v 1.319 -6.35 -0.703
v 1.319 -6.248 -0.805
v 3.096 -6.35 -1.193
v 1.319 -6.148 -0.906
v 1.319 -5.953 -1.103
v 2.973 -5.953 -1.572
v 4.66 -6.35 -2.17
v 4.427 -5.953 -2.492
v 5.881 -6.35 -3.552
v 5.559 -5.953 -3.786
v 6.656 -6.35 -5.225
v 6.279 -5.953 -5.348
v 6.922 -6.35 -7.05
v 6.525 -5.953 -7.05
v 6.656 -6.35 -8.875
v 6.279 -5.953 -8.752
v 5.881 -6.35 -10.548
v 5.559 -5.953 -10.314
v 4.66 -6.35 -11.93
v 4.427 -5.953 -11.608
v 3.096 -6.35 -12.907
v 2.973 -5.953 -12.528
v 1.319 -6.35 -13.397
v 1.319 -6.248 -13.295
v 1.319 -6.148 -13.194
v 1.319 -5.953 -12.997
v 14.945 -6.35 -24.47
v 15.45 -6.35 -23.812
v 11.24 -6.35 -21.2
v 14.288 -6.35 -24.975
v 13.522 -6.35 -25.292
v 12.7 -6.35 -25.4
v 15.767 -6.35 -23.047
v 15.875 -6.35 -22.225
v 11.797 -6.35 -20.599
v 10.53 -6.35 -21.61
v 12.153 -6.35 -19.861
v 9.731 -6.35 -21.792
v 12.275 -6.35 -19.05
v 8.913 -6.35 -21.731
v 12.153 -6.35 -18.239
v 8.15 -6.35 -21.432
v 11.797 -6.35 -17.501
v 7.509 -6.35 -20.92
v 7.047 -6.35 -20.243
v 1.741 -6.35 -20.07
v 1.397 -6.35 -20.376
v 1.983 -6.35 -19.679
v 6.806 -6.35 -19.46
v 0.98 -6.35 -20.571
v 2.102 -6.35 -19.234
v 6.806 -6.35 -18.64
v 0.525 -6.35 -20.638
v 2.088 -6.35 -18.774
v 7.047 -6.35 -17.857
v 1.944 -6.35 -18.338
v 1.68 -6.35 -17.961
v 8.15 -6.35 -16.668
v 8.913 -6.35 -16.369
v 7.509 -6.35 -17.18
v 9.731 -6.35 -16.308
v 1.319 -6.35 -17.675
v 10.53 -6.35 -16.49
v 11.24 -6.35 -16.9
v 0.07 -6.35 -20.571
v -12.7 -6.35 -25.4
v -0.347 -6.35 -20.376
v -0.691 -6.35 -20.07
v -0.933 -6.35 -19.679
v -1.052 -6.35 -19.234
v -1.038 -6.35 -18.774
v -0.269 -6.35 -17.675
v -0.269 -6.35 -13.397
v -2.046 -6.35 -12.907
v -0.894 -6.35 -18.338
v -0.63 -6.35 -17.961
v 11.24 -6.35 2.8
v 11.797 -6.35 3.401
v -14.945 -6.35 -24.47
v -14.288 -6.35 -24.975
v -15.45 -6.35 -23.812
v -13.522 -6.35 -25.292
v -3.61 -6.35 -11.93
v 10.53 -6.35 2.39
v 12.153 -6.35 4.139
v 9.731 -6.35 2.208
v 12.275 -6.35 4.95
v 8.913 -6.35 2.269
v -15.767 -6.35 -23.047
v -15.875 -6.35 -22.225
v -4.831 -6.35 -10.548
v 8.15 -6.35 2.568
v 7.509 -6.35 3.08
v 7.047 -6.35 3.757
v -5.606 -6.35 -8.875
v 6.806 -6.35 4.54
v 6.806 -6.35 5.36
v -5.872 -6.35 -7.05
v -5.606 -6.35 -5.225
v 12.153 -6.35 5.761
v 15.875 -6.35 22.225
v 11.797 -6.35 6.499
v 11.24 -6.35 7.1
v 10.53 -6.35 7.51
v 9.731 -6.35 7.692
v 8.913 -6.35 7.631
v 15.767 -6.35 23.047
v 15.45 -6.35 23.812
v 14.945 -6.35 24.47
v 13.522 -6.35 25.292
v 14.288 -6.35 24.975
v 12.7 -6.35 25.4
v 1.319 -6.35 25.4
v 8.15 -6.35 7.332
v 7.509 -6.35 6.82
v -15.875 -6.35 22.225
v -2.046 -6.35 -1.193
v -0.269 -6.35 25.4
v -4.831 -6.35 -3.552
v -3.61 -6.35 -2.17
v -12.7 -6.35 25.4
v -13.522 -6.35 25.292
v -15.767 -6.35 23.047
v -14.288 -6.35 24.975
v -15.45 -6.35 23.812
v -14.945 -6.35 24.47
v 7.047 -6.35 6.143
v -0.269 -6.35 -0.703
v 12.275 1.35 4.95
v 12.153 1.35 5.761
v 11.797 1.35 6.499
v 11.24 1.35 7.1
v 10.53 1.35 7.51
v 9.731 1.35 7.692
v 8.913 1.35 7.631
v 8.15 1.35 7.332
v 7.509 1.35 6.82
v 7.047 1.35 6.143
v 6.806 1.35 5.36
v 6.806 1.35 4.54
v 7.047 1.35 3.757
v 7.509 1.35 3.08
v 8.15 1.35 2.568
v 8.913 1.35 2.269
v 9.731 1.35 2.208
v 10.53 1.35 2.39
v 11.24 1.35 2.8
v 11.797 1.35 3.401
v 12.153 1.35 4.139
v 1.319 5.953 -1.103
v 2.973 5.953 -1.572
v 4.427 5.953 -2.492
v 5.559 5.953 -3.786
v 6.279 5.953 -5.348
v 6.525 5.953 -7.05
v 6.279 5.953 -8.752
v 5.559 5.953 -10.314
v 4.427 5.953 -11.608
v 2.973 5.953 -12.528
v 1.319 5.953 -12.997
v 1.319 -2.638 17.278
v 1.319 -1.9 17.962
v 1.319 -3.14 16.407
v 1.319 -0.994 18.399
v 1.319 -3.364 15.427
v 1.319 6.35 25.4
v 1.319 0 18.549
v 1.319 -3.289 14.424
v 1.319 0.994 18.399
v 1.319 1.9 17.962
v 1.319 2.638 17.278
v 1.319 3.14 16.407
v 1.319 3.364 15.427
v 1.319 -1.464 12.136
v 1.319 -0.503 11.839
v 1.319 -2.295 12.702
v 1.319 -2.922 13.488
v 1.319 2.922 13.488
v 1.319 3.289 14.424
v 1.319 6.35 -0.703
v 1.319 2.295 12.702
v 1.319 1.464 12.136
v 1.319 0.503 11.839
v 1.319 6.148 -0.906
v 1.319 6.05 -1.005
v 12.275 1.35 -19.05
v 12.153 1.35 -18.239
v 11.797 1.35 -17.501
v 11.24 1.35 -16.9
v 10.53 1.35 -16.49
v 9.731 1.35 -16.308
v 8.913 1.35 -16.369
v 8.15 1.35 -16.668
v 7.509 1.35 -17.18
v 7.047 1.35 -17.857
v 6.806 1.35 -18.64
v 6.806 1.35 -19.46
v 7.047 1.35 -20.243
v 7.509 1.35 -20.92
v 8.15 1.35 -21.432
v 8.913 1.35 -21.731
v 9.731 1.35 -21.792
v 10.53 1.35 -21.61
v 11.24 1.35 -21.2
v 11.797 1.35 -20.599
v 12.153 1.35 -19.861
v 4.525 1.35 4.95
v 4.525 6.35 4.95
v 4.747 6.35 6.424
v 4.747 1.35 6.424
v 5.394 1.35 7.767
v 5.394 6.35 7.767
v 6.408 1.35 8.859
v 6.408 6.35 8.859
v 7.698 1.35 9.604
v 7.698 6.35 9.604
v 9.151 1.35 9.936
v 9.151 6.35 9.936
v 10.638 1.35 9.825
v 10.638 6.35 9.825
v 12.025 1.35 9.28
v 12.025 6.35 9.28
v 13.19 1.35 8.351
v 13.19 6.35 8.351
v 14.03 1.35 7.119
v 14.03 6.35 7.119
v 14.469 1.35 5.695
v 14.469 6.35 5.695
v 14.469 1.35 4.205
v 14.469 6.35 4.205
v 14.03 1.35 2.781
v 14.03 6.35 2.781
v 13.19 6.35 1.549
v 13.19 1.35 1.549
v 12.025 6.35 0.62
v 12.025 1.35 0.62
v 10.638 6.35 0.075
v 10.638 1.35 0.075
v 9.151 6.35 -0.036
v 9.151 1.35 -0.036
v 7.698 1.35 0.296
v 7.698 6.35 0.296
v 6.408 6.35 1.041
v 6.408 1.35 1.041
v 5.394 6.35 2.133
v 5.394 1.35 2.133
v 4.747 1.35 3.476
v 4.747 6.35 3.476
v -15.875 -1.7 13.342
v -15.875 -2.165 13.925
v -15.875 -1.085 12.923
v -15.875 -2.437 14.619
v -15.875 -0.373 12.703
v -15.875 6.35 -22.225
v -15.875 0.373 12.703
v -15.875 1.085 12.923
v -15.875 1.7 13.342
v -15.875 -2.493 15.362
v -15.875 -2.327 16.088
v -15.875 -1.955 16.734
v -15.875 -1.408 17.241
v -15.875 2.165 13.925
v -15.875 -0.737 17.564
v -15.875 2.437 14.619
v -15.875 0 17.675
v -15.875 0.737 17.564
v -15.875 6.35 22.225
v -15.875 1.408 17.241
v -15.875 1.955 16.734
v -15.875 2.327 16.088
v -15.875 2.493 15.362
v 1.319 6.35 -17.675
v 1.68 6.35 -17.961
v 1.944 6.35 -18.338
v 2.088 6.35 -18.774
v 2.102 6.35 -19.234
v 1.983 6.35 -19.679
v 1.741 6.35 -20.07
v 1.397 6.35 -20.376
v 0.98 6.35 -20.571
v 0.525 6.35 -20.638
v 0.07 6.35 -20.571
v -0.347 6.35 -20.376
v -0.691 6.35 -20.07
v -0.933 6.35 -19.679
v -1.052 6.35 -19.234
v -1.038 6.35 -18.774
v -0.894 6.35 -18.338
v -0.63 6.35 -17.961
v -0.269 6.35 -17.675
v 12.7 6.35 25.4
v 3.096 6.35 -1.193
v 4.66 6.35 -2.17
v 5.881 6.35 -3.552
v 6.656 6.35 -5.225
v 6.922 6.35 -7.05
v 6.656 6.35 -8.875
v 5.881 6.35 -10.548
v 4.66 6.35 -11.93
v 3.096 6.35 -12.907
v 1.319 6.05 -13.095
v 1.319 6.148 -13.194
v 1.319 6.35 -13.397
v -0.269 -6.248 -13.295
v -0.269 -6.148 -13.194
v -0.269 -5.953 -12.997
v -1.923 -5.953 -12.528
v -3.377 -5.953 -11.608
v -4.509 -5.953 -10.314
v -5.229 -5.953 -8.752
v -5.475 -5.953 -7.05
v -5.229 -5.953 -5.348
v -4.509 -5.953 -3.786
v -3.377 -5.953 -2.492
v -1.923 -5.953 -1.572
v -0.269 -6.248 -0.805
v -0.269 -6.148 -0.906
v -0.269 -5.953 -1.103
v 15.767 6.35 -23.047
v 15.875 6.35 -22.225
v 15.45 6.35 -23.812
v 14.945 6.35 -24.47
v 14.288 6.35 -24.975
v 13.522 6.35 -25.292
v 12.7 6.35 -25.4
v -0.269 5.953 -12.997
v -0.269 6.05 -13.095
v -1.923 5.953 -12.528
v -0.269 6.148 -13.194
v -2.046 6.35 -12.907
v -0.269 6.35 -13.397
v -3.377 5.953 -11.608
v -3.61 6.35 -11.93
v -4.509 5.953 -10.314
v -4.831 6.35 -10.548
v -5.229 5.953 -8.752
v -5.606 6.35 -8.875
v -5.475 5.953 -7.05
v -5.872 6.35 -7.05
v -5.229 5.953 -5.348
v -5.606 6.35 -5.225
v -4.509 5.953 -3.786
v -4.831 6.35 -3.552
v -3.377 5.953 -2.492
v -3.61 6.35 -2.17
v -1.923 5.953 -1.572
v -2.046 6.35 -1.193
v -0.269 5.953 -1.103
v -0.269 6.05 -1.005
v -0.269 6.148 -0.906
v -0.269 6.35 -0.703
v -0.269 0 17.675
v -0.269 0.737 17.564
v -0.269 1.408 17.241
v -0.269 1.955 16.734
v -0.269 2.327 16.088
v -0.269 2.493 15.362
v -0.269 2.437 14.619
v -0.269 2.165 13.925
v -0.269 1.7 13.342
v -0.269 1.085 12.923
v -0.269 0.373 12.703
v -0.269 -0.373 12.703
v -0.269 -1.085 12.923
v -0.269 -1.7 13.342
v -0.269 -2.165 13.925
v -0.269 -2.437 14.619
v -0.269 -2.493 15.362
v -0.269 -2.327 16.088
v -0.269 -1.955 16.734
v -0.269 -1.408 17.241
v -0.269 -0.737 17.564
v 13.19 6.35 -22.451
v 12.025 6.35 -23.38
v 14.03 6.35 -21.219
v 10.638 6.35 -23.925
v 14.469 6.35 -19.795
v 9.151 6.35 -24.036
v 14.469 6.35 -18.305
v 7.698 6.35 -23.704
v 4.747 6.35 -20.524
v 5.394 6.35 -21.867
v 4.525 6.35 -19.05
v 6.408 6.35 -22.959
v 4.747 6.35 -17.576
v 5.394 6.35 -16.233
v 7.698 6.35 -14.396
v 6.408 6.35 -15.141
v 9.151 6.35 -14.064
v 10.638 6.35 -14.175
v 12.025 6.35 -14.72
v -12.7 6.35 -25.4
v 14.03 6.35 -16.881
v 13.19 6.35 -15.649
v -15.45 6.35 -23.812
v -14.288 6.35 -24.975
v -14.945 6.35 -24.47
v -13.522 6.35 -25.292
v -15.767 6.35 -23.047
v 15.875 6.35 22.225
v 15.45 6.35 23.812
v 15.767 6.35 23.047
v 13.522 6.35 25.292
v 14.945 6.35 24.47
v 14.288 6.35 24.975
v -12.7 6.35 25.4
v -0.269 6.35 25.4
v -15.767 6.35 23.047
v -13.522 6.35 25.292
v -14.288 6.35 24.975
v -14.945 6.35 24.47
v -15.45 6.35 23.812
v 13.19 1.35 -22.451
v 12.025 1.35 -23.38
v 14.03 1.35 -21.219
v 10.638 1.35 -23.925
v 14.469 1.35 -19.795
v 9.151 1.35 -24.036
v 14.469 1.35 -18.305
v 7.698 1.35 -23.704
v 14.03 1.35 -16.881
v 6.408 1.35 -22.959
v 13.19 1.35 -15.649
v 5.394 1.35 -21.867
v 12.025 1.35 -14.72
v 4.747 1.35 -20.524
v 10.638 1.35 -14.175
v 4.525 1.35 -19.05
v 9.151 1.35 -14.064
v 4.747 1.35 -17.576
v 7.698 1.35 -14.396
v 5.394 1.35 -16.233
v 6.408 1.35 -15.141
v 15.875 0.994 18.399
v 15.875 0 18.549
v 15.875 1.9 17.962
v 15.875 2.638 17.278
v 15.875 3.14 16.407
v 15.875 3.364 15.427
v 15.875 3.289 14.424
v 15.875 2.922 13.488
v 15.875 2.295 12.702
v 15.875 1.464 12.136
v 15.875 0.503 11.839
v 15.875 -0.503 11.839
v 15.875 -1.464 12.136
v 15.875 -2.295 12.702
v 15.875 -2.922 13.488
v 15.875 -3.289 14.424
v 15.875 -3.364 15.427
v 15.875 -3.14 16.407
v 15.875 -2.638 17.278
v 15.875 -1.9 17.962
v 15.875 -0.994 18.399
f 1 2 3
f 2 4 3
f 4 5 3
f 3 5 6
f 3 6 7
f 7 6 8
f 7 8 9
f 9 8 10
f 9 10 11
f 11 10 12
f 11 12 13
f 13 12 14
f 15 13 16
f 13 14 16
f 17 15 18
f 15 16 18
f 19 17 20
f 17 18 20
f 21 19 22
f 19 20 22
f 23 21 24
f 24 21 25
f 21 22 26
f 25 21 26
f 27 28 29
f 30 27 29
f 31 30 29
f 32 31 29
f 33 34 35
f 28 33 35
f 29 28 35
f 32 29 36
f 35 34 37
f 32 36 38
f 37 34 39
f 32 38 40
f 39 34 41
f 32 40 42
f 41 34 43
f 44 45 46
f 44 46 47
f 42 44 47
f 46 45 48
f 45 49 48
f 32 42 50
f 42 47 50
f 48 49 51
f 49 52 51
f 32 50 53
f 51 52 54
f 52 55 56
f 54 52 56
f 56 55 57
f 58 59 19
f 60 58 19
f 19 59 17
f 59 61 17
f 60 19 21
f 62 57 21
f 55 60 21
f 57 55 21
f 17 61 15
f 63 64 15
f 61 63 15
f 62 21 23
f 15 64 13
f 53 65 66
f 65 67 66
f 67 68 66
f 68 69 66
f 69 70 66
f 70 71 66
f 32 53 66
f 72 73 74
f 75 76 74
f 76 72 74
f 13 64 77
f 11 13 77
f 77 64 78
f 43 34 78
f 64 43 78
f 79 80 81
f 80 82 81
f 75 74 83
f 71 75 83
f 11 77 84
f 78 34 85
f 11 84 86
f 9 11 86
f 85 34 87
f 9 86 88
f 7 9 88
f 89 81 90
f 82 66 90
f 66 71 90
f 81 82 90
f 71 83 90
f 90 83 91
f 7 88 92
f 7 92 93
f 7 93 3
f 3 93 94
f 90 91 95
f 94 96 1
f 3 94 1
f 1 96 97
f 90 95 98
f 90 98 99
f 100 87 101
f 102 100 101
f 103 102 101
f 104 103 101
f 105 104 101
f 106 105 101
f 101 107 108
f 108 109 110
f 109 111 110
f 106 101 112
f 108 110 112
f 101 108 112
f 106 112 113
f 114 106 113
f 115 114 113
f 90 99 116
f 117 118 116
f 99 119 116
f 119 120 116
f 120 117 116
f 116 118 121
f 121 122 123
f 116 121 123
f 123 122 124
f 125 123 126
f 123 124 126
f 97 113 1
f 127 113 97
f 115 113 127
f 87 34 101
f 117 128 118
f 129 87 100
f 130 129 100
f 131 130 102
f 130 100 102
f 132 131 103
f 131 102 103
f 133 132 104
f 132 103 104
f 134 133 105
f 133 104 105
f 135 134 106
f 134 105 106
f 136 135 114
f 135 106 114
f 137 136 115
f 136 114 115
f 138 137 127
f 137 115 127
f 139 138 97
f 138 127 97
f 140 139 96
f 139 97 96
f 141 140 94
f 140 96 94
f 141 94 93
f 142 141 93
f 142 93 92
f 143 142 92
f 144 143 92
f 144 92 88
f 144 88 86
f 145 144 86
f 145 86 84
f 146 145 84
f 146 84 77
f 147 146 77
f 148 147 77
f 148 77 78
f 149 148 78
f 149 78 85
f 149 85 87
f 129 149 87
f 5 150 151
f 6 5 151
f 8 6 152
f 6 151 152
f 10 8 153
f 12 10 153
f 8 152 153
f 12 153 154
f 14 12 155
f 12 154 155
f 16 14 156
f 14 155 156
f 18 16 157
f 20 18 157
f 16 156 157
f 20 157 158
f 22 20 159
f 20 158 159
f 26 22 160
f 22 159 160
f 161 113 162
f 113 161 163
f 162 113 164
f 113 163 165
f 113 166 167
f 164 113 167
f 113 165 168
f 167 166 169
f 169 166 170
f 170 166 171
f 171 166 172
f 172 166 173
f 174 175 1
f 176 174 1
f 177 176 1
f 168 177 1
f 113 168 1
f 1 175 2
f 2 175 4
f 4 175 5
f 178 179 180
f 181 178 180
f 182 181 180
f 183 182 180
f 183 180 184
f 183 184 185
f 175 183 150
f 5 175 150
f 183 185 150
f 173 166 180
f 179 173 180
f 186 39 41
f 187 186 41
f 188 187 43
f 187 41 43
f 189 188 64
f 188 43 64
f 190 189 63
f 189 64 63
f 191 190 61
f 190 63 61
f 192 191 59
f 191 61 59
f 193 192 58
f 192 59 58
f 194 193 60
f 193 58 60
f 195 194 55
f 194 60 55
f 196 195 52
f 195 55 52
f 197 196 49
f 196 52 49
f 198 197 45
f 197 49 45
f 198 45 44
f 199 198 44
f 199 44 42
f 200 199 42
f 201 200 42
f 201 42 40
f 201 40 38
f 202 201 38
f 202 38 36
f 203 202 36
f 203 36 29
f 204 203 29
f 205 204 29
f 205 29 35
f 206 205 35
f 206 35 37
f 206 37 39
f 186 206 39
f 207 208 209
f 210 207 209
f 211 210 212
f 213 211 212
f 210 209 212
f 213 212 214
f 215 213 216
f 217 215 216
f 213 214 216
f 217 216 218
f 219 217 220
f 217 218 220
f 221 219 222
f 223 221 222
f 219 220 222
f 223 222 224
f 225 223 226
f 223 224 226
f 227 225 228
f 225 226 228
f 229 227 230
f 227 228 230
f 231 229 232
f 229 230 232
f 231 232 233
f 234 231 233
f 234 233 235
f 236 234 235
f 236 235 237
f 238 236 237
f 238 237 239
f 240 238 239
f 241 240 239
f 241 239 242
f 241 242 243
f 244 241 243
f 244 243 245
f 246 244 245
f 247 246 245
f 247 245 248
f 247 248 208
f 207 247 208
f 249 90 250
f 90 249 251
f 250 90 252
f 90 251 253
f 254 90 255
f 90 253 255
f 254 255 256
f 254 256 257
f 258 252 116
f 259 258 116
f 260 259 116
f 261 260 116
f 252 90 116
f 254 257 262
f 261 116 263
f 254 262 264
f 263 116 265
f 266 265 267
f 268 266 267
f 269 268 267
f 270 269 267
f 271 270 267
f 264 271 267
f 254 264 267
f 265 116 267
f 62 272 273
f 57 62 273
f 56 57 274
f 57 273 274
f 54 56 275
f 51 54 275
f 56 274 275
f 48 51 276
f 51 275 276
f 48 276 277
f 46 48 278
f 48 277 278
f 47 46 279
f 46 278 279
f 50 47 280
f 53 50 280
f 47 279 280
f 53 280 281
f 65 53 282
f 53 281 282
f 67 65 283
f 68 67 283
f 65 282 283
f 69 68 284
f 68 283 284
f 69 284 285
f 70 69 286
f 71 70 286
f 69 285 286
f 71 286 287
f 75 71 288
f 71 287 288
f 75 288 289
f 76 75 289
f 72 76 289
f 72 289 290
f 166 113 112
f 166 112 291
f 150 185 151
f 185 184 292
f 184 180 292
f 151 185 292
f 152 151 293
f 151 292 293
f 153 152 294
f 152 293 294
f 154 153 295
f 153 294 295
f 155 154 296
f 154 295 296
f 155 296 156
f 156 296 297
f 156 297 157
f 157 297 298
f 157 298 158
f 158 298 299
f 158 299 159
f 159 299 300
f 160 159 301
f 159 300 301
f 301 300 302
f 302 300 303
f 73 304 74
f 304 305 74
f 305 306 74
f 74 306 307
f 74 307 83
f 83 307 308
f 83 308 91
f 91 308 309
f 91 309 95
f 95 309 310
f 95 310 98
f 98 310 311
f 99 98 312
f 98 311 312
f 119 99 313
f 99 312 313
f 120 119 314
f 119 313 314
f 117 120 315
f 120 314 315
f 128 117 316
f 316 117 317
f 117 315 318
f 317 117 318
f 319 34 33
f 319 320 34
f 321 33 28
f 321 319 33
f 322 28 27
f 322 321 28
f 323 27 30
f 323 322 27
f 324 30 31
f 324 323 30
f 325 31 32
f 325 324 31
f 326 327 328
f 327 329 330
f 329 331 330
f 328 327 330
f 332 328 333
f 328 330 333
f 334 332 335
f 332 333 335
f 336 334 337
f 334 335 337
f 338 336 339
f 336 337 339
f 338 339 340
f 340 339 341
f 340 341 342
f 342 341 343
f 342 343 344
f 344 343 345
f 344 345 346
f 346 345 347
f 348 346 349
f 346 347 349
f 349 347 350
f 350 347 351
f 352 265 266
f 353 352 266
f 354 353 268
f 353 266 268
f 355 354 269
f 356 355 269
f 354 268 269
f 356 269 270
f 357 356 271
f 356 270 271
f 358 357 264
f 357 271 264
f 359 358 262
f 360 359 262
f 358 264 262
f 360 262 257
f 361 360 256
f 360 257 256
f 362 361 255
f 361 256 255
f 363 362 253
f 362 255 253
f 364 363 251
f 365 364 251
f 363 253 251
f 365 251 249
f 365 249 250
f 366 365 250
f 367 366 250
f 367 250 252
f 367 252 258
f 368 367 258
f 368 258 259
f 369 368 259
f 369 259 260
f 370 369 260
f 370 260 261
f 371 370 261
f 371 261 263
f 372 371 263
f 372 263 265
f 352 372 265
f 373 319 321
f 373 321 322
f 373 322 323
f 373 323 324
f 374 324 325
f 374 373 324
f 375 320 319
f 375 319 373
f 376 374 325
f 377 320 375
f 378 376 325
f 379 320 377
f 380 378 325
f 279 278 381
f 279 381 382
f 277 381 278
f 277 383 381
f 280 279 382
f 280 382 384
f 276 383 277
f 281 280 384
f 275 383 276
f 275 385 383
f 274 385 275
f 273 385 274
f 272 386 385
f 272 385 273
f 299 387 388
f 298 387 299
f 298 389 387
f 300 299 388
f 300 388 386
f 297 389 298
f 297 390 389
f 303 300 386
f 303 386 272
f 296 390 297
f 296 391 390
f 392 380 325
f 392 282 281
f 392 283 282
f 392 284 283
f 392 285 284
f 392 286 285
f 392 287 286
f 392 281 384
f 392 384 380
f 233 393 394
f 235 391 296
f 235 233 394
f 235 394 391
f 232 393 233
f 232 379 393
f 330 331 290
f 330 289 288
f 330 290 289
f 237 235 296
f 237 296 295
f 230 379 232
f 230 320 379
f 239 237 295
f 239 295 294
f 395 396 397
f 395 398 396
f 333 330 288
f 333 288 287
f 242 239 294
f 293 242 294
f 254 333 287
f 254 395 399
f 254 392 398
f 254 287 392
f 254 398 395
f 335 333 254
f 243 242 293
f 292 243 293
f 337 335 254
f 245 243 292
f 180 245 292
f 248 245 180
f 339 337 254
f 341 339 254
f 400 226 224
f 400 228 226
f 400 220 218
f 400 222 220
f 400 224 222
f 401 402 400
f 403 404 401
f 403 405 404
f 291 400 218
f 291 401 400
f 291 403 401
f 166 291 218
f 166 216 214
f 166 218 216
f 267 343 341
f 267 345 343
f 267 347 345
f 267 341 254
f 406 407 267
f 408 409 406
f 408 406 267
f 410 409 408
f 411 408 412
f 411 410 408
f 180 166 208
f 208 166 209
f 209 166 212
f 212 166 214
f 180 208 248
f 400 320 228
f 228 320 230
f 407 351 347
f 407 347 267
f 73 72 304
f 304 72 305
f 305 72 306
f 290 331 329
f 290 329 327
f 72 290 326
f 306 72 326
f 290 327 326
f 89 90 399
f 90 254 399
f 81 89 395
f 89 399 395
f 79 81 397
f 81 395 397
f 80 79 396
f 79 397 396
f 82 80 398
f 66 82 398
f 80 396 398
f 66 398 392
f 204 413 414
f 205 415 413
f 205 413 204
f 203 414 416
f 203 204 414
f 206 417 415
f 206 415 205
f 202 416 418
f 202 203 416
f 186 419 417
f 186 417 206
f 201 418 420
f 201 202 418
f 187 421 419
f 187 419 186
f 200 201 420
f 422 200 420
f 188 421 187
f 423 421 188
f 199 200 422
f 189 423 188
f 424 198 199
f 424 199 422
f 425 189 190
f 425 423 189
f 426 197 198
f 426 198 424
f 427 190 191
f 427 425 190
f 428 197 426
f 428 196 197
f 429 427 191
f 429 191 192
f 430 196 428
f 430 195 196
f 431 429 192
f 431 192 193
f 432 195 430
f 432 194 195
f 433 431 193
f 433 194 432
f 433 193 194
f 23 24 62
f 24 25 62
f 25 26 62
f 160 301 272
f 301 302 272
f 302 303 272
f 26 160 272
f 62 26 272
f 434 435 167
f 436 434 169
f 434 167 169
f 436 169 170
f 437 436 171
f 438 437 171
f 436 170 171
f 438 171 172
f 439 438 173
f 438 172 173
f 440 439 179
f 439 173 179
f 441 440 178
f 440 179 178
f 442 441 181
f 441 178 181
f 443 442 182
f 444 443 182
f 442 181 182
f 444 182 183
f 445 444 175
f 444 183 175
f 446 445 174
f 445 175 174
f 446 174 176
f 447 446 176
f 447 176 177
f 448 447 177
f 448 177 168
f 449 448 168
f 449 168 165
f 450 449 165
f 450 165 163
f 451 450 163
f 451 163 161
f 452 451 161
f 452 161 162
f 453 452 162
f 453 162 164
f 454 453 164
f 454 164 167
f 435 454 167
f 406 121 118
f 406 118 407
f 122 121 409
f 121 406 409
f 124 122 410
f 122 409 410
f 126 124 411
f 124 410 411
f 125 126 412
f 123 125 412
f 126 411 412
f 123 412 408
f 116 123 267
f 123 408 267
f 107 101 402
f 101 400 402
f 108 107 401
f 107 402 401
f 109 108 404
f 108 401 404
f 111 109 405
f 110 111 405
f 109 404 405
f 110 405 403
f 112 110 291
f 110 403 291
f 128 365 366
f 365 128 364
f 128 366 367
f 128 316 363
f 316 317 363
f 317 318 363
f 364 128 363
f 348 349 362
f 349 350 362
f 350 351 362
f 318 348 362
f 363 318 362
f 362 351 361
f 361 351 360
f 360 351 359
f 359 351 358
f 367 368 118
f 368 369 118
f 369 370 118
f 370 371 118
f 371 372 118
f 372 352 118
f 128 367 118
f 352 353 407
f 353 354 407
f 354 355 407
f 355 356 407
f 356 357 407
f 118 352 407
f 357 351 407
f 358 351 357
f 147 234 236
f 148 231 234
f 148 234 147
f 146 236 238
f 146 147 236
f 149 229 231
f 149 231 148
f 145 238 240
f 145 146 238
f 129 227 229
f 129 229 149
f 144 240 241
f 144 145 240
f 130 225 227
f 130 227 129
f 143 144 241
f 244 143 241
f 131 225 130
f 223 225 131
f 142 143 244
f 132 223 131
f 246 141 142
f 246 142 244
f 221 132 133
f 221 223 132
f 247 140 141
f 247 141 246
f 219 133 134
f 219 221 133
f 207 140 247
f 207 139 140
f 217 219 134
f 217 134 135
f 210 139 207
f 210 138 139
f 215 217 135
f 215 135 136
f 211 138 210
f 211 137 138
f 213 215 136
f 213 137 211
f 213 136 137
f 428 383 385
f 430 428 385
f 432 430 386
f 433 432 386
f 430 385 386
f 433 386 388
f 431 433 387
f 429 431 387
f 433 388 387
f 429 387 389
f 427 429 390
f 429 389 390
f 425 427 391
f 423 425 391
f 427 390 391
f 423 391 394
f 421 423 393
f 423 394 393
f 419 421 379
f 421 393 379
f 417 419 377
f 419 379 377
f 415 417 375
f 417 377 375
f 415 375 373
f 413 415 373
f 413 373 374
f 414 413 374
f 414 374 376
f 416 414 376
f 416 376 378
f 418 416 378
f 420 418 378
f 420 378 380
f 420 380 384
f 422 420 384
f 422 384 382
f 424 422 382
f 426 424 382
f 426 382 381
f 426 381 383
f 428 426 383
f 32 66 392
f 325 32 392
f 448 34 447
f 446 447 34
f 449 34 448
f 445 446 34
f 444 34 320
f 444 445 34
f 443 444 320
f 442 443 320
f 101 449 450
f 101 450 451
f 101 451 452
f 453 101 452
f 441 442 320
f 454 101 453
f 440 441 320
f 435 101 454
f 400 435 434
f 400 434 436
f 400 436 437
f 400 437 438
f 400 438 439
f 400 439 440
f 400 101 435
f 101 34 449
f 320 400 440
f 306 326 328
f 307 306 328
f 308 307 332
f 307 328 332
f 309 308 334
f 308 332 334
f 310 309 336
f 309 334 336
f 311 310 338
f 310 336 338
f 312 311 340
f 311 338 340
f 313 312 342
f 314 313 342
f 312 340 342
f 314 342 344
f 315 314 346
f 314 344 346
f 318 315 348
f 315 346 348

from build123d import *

# Parameters (mm, degrees)
SKETCH1_W                            = 12.7
SKETCH1_H                            = 31.75
EXTRUDE1_DEPTH                       = 25.4
CBORE_FOR_M5_SHCS1_D                 = 5.5
CBORE_FOR_M5_SHCS1_DEPTH             = 12.7
CBORE_FOR_M5_SHCS1_CBORE_D           = 10
CBORE_FOR_M5_SHCS1_CBORE_DEPTH       = 5
CUT_EXTRUDE1_REACH                   = 14.7
F_17_64_0_26563_DIAMETER_HOLE1_D     = 6.747002
F_17_64_0_26563_DIAMETER_HOLE1_DEPTH = 14.55625
M6X1_0_TAPPED_HOLE1_D                = 5
M6X1_0_TAPPED_HOLE1_DEPTH            = 15.60625
FILLET1_R                            = 3.175
CHAMFER1_SIZE                        = 0.396875


with BuildPart() as part:
    # Sketch1 → Extrude1 (new body, symmetric)
    with BuildSketch(Plane(origin=(0, 0, 0), x_dir=(0, 1, 0), z_dir=(0, 0, 1))):
        Rectangle(SKETCH1_W, SKETCH1_H)
    extrude(amount=EXTRUDE1_DEPTH, both=True)

    # CBORE for M5 SHCS1
    with Locations(Plane(origin=(0, 6.35, 0), x_dir=(-1, 0, 0), z_dir=(0, 1, 0))):
        with Locations((-9.525, -19.05), (-9.525, 4.95)):
            CounterBoreHole(CBORE_FOR_M5_SHCS1_D / 2, CBORE_FOR_M5_SHCS1_CBORE_D / 2, CBORE_FOR_M5_SHCS1_CBORE_DEPTH, depth=CBORE_FOR_M5_SHCS1_DEPTH)

    # Sketch4 → Cut-Extrude1 (cut, up to next)
    with BuildSketch(Plane(origin=(0, 6.35, 0), x_dir=(1, 0, 0), z_dir=(0, 1, 0)), mode=Mode.PRIVATE) as cut_extrude1_sk1:
        with BuildLine():
            Line((-0.26875, 17.675184671), (-0.26875, 12.997264996))
            ThreePointArc((-0.26875, 12.997264996), (-5.475, 7.05), (-0.26875, 1.102735004))
            Line((-0.26875, 1.102735004), (-0.26875, -25.4))
            Line((-0.26875, -25.4), (1.31875, -25.4))
            Line((1.31875, -25.4), (1.31875, 1.102735004))
            ThreePointArc((1.31875, 1.102735004), (6.525, 7.05), (1.31875, 12.997264996))
            Line((1.31875, 12.997264996), (1.31875, 17.675184671))
            ThreePointArc((1.31875, 17.675184671), (0.525, 20.6375), (-0.26875, 17.675184671))
        make_face()
    cut_extrude1_tool1 = extrude(cut_extrude1_sk1.sketch, amount=-CUT_EXTRUDE1_REACH, mode=Mode.PRIVATE) & part.part
    add(cut_extrude1_tool1.solids().sort_by_distance((0.525, 6.35, -3.20917))[0], mode=Mode.SUBTRACT)

    # 17/64 (0.26563) Diameter Hole1
    with Locations(Plane(origin=(15.875, 0, 0), x_dir=(0, 0, -1), z_dir=(1, 0, 0))):
        with Locations((-15.175, 0)):
            Hole(F_17_64_0_26563_DIAMETER_HOLE1_D / 2, depth=F_17_64_0_26563_DIAMETER_HOLE1_DEPTH)

    # M6x1.0 Tapped Hole1
    with Locations(Plane(origin=(-0.26875, 0, 0), x_dir=(0, 0, -1), z_dir=(1, 0, 0))):
        with Locations((-15.175, 0)):
            Hole(M6X1_0_TAPPED_HOLE1_D / 2, depth=M6X1_0_TAPPED_HOLE1_DEPTH)

    # Fillet1
    fillet1_edges = [part.edges().sort_by_distance(p)[0] for p in [
        (15.875, 0, 25.4),
        (15.875, 0, -25.4),
        (-15.875, 0, -25.4),
        (-15.875, 0, 25.4),
    ]]
    fillet(fillet1_edges, radius=FILLET1_R)

    # Chamfer1
    chamfer1_edges = [part.edges().sort_by_distance(p)[0] for p in [
        (-5.475, 6.35, -7.05),
        (6.525, 6.35, -7.05),
        (6.525, -6.35, -7.05),
        (-5.475, -6.35, -7.05),
    ]]
    chamfer(chamfer1_edges, length=CHAMFER1_SIZE)


solid = part.part
